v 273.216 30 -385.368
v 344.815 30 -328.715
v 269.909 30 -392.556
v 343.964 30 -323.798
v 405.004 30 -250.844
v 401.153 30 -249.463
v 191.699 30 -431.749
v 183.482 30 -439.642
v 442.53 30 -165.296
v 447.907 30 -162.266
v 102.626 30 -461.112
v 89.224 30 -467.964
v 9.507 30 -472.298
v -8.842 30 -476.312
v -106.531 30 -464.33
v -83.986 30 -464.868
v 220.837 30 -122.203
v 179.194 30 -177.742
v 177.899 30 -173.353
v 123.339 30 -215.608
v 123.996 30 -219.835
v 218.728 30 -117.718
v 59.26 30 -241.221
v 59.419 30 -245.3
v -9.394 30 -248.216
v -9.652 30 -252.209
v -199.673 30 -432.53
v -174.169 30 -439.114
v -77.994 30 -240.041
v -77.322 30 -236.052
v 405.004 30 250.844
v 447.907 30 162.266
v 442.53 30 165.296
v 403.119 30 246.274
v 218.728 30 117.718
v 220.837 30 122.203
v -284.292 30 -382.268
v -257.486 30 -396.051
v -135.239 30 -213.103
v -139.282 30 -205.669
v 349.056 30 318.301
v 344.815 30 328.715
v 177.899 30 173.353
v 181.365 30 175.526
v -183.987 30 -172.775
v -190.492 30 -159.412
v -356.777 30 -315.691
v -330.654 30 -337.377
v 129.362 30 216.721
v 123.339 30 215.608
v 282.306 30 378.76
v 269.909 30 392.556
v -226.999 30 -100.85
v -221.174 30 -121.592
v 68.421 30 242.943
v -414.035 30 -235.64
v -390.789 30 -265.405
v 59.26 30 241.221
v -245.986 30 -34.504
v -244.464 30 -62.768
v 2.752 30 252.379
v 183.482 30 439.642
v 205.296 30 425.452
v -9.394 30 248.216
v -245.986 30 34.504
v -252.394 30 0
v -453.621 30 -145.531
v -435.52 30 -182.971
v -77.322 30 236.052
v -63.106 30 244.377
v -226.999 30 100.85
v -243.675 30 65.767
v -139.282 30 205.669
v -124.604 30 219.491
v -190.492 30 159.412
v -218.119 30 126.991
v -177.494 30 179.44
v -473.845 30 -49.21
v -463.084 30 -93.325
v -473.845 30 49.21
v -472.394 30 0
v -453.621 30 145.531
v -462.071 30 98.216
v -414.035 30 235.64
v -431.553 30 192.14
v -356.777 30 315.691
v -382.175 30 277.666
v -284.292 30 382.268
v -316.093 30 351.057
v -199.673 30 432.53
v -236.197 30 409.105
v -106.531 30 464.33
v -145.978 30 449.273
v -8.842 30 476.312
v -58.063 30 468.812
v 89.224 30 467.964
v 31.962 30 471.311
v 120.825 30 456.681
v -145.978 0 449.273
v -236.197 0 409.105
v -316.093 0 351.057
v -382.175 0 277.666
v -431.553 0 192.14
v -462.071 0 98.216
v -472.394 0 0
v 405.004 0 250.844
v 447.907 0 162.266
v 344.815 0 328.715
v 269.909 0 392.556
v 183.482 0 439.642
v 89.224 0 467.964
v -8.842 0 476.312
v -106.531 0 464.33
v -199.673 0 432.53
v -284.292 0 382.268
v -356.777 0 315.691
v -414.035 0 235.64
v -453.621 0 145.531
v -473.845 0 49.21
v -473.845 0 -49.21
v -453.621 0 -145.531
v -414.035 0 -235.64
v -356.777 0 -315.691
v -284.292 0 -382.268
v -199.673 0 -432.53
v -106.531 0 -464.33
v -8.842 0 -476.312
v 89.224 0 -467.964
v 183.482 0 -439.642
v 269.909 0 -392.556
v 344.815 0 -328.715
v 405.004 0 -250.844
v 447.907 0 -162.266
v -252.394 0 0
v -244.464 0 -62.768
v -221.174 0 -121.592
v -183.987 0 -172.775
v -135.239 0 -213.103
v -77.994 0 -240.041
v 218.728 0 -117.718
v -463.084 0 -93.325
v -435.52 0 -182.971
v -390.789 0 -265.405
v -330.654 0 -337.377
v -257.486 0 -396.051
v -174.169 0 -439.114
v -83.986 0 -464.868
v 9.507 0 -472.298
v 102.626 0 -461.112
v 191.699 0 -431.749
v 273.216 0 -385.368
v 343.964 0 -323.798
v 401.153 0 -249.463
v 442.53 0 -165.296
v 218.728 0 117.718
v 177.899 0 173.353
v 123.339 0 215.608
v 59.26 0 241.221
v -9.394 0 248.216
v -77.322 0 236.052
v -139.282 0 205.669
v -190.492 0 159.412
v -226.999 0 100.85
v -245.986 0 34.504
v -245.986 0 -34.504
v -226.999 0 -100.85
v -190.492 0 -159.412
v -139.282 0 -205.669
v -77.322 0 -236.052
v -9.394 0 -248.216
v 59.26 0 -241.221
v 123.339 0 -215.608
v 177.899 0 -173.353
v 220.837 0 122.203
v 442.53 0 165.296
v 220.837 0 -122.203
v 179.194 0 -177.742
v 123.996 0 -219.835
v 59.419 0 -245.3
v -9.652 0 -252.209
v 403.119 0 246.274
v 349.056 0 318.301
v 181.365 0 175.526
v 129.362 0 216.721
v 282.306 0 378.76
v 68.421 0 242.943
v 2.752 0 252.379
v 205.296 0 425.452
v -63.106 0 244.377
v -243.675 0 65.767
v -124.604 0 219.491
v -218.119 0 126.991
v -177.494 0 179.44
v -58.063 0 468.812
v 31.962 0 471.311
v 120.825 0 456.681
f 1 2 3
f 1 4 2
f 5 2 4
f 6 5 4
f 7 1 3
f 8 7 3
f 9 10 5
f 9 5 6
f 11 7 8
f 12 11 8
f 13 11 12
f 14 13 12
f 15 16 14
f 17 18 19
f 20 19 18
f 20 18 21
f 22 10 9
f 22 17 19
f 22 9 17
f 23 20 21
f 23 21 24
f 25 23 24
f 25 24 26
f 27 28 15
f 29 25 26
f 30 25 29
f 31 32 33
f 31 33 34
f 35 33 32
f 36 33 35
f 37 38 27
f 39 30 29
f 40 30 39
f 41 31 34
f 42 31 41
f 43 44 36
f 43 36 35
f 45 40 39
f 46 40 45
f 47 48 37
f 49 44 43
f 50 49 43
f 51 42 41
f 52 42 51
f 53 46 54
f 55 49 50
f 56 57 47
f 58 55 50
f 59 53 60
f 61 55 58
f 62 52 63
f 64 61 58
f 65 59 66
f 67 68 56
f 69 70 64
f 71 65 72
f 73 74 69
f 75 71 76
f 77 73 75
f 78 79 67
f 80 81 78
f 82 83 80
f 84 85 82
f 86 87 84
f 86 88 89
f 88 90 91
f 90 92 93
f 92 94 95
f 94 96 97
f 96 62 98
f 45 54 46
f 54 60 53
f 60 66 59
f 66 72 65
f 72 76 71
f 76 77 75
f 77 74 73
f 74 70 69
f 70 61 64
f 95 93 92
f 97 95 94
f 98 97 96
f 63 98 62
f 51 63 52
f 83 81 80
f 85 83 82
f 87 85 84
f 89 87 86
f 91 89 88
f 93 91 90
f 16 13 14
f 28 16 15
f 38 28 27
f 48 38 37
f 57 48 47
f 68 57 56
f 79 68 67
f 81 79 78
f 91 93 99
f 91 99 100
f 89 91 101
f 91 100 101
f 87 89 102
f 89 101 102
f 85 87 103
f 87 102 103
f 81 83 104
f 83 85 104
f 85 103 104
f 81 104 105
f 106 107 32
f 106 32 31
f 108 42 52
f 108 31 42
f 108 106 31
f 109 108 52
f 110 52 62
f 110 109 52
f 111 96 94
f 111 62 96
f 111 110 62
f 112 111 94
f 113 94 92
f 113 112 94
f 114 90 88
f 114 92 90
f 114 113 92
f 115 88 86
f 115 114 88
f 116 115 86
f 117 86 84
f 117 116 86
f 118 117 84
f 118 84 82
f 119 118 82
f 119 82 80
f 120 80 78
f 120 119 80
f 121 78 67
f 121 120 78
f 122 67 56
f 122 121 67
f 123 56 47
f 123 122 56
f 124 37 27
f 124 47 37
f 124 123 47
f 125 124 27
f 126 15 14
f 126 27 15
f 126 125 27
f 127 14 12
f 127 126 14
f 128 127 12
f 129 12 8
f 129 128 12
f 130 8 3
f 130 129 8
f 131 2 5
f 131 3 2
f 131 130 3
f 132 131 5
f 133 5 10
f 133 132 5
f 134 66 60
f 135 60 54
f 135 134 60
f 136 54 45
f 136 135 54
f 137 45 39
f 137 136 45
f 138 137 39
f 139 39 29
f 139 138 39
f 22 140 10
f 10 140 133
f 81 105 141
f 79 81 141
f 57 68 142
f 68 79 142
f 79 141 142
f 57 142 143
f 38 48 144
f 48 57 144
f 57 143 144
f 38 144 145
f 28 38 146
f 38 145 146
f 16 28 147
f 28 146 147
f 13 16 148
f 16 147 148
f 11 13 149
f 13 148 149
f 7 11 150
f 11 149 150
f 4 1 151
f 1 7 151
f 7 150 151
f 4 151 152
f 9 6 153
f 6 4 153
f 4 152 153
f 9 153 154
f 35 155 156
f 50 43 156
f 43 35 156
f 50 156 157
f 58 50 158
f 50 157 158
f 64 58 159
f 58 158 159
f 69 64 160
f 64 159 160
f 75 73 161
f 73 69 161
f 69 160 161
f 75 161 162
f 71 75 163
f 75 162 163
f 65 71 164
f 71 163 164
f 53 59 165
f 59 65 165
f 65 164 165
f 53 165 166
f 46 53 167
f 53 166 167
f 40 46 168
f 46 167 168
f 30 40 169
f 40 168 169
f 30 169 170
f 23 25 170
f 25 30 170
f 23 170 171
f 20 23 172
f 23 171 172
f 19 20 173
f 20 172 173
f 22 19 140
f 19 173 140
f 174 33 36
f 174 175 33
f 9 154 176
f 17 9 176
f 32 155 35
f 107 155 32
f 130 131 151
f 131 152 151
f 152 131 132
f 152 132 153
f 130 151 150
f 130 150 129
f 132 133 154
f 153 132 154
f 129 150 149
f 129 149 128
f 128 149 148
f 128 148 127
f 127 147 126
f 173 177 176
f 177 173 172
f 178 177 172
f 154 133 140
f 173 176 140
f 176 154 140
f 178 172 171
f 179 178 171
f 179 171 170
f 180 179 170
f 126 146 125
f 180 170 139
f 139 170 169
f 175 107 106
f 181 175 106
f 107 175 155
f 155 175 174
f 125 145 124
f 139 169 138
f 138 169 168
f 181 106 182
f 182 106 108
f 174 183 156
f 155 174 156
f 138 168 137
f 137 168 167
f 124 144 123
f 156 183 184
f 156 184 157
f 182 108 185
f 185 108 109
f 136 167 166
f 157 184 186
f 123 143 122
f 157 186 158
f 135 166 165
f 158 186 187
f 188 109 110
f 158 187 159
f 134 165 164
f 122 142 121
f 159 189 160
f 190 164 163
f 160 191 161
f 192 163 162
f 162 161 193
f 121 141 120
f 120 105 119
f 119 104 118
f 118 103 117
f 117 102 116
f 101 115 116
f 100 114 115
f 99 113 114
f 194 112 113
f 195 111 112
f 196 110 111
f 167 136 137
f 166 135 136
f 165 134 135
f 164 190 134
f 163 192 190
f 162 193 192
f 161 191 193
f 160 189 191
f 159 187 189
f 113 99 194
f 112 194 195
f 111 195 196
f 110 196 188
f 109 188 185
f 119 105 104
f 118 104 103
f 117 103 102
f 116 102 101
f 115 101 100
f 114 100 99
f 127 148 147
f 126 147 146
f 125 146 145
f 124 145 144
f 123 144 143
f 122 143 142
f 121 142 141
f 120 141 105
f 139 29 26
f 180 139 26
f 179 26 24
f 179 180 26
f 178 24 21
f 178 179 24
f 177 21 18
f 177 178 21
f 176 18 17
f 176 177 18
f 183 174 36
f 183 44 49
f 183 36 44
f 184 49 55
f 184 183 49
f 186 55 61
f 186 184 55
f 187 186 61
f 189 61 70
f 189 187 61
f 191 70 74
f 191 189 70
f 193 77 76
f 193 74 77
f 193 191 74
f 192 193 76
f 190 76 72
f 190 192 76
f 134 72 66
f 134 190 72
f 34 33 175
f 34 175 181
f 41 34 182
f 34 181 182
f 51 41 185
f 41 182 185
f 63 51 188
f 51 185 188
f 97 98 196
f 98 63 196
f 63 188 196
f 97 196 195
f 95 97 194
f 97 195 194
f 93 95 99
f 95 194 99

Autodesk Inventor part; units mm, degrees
ref_plane "YZ Plane" through (0, 0, 0) normal (1, 0, 0) x (0, 1, 0)
ref_plane "XZ Plane" through (0, 0, 0) normal (0, 1, 0) x (-1, 0, 0)
ref_plane "XY Plane" through (0, 0, 0) normal (0, 0, 1) x (1, 0, 0)
sketch "Sketch1" plane through (0, 0, 0) normal (0, 1, 0) x (-1, 0, 0)
  arc A0 (472.3938, 0) -> (145.9777, 449.2732) centre (0, 0) ccw
  arc A1 (77.994, -240.0408) -> (252.3938, 0) centre (0, 0) ccw
  line L0 (-442.5303, 165.2961) -> (-220.837, 122.2033)
  line L1 (-442.5303, -165.2961) -> (-220.837, -122.2033)
  arc A2 (252.3938, 0) -> (-220.837, 122.2033) centre (0, 0) ccw
  arc A3 (-220.837, -122.2033) -> (77.994, -240.0408) centre (0, 0) ccw
  arc A4 (145.9777, 449.2732) -> (-442.5303, 165.2961) centre (0, 0) ccw
  arc A5 (-442.5303, -165.2961) -> (472.3938, 0) centre (0, 0) ccw
  arc A6 (-218.7278, -117.7184) -> (-218.7278, 117.7184) centre (0, 0) ccw
  arc A7 (-447.907, -162.2663) -> (-447.907, 162.2663) centre (0, 0) ccw
  line L2 (-218.7278, 117.7184) -> (-447.907, 162.2663)
  line L3 (-218.7278, -117.7184) -> (-447.907, -162.2663)
  dimension "d41" = 4
  dimension "d42" = 4
  dimension "d43" = 4
  dimension "d44" = 4
extrude "Extrusion1" add sketch "Sketch1" along normal blind 30
properties part number "Level 1 Edge Banding"
